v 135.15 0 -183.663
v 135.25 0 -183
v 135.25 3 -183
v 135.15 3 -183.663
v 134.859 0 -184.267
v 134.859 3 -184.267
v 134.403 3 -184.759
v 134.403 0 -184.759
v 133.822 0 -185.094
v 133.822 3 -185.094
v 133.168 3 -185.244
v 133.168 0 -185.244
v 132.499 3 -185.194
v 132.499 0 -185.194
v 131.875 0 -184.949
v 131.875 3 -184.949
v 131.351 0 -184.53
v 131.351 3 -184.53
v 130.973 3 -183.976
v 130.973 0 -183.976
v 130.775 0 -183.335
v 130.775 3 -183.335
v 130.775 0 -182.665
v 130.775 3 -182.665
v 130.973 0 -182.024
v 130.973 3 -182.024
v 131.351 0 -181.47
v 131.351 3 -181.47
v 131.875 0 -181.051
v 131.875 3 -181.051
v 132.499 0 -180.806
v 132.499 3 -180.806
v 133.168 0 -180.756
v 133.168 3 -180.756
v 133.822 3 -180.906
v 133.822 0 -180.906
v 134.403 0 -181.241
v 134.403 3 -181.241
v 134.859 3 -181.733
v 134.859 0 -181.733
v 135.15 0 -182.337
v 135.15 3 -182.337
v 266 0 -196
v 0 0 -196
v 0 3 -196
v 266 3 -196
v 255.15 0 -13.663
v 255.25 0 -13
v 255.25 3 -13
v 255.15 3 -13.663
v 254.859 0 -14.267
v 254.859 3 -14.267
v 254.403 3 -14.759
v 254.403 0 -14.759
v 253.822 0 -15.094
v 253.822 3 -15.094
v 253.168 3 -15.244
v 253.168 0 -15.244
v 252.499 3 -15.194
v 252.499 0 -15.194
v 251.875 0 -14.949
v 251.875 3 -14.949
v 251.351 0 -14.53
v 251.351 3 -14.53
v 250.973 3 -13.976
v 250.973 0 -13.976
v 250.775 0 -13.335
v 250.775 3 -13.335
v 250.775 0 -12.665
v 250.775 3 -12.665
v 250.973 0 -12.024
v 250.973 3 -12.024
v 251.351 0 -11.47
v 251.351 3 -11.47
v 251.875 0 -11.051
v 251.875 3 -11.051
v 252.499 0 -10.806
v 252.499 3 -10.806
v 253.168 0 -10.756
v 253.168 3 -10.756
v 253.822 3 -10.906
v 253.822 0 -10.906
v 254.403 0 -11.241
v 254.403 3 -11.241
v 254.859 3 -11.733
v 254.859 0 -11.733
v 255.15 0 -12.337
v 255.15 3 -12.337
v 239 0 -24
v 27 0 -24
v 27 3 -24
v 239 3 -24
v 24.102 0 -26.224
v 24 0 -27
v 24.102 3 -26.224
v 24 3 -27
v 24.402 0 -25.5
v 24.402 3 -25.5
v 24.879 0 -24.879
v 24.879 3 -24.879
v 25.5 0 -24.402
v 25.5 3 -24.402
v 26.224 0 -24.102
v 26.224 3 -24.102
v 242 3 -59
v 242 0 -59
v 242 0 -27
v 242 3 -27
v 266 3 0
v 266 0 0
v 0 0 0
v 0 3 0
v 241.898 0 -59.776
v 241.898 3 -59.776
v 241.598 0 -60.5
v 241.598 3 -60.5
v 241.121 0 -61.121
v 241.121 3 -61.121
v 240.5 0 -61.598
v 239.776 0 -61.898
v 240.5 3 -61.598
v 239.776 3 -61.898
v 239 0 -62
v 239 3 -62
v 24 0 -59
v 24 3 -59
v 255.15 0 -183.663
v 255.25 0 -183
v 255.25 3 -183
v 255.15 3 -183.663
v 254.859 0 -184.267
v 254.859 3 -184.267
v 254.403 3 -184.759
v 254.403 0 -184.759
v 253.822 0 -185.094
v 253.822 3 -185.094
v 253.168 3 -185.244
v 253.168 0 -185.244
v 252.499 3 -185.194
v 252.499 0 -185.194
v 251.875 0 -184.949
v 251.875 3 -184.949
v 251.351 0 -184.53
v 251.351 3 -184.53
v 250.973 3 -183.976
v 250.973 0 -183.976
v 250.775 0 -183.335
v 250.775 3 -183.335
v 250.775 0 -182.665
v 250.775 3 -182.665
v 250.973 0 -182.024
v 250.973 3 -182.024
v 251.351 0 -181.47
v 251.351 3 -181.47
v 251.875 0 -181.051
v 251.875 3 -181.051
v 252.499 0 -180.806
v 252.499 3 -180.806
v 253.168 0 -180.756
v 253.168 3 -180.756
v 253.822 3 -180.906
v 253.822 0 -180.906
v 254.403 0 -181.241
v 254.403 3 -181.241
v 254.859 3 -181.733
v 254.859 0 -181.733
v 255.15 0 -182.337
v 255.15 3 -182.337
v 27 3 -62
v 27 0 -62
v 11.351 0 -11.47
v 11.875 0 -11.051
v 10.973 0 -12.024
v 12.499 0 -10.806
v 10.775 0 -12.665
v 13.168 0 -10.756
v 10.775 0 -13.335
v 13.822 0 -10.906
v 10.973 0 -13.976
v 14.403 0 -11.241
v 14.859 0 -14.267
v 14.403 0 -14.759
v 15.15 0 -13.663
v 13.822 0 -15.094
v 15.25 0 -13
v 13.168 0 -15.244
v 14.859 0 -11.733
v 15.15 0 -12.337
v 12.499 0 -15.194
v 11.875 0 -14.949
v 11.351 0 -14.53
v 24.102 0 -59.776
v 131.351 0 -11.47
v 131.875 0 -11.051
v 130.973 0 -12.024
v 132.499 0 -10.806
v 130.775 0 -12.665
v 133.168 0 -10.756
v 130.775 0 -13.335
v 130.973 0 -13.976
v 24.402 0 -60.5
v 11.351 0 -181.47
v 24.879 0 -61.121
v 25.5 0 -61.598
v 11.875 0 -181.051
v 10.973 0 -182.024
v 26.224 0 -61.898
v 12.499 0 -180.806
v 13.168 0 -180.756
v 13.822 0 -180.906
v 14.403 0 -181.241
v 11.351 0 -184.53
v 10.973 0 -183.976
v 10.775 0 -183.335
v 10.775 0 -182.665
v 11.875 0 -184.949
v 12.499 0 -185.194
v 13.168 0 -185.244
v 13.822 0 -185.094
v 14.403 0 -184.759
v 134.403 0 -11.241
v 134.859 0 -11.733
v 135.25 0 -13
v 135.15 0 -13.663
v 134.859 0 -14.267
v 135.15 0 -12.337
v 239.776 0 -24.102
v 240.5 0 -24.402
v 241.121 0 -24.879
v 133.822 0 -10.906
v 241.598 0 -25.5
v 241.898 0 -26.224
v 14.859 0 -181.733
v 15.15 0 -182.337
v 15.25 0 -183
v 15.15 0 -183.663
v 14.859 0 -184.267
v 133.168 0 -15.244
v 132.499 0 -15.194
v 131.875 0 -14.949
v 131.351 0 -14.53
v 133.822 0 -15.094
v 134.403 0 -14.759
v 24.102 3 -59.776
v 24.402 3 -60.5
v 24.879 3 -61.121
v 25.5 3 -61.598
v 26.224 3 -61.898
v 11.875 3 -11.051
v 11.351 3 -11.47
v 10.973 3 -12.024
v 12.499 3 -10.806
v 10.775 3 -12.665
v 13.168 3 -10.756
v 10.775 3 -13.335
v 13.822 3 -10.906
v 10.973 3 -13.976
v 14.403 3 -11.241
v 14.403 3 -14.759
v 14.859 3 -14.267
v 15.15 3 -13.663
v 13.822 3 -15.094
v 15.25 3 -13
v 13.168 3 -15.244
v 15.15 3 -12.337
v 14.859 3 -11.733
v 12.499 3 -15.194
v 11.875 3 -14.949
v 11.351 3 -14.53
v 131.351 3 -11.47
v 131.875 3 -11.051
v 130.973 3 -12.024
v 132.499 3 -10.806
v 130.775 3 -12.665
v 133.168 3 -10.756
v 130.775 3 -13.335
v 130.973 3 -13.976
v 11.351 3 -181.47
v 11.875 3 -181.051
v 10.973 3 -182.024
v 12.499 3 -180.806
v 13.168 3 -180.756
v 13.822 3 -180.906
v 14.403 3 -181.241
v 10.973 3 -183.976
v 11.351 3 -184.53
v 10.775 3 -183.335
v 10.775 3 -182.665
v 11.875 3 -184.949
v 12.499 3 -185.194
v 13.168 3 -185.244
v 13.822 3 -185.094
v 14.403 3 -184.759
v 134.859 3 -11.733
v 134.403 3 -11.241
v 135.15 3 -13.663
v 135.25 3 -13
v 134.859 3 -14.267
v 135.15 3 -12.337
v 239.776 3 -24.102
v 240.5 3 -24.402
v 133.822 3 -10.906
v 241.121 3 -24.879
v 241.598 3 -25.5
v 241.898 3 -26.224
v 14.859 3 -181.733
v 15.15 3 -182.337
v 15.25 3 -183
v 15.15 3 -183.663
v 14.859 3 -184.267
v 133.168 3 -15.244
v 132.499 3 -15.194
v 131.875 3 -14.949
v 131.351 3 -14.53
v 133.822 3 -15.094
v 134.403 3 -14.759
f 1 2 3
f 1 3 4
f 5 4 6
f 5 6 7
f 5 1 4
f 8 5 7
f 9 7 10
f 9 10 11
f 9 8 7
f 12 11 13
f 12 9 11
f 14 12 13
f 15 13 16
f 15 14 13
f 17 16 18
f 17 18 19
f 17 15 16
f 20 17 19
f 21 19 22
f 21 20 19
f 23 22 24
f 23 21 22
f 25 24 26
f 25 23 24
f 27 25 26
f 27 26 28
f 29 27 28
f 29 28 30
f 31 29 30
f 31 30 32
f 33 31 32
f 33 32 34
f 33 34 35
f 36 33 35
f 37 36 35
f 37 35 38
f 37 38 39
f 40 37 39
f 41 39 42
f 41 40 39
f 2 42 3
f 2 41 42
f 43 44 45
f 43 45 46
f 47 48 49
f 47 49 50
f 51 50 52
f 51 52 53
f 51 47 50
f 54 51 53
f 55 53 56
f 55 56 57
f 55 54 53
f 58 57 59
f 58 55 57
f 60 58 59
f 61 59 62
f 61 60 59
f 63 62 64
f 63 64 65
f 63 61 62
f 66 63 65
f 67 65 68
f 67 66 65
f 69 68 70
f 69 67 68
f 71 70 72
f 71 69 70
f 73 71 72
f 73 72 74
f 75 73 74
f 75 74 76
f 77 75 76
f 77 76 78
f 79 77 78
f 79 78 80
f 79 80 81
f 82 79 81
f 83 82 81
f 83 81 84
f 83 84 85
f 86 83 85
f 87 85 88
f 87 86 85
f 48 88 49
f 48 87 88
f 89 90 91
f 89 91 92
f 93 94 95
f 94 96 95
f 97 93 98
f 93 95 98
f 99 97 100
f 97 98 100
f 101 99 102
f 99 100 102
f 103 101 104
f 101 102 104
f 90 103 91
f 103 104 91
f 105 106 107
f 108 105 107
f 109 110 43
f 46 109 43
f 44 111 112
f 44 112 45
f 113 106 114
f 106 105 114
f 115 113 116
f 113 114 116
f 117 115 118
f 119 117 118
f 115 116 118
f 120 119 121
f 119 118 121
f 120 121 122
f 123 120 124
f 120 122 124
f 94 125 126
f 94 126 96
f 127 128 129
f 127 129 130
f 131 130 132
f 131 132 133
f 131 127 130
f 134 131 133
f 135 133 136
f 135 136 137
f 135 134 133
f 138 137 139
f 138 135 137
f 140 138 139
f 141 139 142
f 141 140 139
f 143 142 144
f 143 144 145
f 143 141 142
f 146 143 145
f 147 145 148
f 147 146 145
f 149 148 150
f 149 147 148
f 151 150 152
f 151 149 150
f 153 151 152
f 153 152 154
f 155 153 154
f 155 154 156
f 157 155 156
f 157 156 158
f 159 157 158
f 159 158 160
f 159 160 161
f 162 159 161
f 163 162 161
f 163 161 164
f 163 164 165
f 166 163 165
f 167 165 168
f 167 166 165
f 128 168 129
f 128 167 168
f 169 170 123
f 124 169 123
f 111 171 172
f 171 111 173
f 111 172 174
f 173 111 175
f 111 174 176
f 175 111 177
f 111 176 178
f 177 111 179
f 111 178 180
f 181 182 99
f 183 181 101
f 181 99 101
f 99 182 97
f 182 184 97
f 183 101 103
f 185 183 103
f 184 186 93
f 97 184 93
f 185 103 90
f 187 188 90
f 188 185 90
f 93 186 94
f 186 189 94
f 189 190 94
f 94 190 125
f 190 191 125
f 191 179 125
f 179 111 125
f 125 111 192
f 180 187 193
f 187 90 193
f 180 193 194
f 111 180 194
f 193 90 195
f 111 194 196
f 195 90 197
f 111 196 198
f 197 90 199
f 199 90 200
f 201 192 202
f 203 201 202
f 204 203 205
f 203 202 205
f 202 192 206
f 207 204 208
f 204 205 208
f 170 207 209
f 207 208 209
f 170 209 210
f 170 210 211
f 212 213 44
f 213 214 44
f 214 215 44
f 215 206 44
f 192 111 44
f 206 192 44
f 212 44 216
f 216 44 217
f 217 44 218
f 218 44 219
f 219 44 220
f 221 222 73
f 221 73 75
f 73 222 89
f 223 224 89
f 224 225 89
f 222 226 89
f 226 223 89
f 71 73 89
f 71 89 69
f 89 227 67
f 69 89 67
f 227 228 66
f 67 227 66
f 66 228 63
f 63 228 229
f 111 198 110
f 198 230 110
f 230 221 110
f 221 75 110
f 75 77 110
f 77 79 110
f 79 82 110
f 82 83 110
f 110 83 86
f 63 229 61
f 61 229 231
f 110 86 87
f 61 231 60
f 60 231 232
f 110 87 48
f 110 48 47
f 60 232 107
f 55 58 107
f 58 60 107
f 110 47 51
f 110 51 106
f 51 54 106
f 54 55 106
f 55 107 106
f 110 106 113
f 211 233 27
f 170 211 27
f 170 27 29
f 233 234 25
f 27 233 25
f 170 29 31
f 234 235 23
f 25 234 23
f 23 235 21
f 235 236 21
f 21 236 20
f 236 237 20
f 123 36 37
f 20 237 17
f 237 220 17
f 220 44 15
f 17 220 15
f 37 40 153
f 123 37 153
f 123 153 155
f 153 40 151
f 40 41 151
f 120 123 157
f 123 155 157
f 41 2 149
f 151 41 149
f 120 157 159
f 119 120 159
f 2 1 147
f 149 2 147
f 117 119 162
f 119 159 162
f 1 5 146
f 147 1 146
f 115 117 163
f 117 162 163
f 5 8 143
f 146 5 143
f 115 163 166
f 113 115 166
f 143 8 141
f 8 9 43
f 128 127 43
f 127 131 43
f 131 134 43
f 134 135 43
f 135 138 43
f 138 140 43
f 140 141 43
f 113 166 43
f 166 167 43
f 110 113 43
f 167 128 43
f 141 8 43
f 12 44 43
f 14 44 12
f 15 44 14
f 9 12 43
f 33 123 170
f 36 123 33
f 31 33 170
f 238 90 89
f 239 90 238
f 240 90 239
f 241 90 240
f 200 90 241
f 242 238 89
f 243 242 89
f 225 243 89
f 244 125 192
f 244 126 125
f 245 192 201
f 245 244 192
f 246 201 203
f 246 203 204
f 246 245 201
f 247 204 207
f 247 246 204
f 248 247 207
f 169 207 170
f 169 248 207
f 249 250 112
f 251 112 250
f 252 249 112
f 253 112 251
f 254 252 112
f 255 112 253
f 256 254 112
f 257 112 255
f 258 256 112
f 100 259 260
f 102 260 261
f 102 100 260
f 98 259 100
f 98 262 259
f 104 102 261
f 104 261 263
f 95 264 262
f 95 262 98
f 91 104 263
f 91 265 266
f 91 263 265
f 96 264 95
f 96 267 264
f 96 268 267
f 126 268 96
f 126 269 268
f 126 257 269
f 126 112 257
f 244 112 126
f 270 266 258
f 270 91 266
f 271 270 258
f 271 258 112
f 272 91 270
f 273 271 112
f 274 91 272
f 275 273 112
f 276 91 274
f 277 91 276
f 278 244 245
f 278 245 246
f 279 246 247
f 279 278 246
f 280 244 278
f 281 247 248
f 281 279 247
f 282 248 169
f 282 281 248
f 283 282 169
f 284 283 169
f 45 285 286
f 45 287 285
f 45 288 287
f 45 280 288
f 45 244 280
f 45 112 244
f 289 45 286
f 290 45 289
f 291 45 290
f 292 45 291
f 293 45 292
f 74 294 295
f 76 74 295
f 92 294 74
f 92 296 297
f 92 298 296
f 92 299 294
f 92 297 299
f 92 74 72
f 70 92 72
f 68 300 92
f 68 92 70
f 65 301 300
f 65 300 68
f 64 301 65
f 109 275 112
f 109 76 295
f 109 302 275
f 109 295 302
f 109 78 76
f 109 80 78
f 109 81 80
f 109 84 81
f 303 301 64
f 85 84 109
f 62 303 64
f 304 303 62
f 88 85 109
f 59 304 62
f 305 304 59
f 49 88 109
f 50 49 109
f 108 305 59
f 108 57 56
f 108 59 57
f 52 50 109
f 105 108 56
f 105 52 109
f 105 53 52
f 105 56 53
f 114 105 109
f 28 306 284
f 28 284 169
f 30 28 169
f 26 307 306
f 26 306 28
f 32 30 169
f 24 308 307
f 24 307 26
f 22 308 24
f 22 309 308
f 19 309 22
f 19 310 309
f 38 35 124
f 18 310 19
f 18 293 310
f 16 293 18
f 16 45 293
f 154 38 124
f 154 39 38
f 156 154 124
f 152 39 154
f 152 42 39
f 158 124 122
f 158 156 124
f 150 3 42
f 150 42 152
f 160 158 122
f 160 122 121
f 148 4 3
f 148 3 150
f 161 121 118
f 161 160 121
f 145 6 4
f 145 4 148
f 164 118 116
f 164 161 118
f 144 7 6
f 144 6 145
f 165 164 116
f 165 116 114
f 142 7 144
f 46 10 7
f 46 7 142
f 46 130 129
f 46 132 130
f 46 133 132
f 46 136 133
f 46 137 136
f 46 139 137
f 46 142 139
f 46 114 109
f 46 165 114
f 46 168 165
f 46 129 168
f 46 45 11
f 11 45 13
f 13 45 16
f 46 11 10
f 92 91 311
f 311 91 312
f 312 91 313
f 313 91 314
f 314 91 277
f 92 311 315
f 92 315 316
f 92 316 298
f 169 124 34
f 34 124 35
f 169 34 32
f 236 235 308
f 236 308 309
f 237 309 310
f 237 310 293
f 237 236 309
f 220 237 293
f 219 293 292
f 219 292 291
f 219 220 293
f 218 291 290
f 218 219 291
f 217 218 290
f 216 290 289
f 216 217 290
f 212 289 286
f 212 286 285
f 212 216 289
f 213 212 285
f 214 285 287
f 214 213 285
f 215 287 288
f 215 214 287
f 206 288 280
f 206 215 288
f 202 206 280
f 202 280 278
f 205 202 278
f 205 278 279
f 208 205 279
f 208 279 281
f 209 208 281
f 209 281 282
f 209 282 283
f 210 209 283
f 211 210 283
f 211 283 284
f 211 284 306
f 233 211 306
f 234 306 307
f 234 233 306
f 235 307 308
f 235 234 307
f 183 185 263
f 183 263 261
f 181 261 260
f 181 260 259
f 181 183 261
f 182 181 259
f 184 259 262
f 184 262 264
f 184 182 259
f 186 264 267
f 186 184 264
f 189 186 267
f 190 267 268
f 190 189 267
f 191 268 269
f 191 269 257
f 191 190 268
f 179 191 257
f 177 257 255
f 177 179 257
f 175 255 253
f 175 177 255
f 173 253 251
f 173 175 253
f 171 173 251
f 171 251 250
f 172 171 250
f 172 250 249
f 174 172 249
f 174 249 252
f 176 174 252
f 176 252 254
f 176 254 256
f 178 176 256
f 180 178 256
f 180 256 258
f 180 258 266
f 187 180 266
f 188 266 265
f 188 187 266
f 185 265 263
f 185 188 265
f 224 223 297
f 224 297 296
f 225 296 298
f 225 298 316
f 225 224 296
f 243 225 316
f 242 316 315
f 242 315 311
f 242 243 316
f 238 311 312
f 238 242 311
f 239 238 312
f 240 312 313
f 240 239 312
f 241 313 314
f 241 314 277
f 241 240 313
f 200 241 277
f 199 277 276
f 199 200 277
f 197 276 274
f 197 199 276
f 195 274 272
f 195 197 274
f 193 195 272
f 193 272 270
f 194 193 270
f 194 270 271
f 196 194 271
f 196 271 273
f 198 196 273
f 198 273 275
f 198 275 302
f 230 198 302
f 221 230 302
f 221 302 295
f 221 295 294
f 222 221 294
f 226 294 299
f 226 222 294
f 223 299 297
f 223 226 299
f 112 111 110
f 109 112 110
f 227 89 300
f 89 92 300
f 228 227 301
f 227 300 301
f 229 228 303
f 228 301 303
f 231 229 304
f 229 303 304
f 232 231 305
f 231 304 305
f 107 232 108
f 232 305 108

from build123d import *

# Parameters (mm, degrees)
SKETCH_1_W         = 266
SKETCH_1_H         = 196
SKETCH_1_R         = 2.25
EXTRUDE_1_DEPTH    = 3
SKETCH1_W          = 218
SKETCH1_H          = 38
CUT_EXTRUDE1_DEPTH = 4
FILLET1_R          = 3


with BuildPart() as part:
    # Эскиз1 → Бобышка-Вытянуть1 (new body)
    with BuildSketch(Plane(origin=(0, 0, 0), x_dir=(1, 0, 0), z_dir=(0, 1, 0))):
        with Locations((133, 98)):
            Rectangle(SKETCH_1_W, SKETCH_1_H)
        with Locations((13, 183)):
            Circle(SKETCH_1_R, mode=Mode.SUBTRACT)
        with Locations((253, 183)):
            Circle(SKETCH_1_R, mode=Mode.SUBTRACT)
        with Locations((253, 13)):
            Circle(SKETCH_1_R, mode=Mode.SUBTRACT)
        with Locations((13, 13)):
            Circle(SKETCH_1_R, mode=Mode.SUBTRACT)
        with Locations((133, 13)):
            Circle(SKETCH_1_R, mode=Mode.SUBTRACT)
        with Locations((133, 183)):
            Circle(SKETCH_1_R, mode=Mode.SUBTRACT)
    extrude(amount=EXTRUDE_1_DEPTH)

    # Sketch1 → Cut-Extrude1 (cut, through all)
    with BuildSketch(Plane.XZ):
        with Locations((133, -43)):
            Rectangle(SKETCH1_W, SKETCH1_H)
    extrude(amount=-CUT_EXTRUDE1_DEPTH, mode=Mode.SUBTRACT)

    # Fillet1
    fillet1_edges = [part.edges().sort_by_distance(p)[0] for p in [
        (24, 1.5, -62),
        (24, 1.5, -24),
        (242, 1.5, -24),
        (242, 1.5, -62),
    ]]
    fillet(fillet1_edges, radius=FILLET1_R)


solid = part.part
